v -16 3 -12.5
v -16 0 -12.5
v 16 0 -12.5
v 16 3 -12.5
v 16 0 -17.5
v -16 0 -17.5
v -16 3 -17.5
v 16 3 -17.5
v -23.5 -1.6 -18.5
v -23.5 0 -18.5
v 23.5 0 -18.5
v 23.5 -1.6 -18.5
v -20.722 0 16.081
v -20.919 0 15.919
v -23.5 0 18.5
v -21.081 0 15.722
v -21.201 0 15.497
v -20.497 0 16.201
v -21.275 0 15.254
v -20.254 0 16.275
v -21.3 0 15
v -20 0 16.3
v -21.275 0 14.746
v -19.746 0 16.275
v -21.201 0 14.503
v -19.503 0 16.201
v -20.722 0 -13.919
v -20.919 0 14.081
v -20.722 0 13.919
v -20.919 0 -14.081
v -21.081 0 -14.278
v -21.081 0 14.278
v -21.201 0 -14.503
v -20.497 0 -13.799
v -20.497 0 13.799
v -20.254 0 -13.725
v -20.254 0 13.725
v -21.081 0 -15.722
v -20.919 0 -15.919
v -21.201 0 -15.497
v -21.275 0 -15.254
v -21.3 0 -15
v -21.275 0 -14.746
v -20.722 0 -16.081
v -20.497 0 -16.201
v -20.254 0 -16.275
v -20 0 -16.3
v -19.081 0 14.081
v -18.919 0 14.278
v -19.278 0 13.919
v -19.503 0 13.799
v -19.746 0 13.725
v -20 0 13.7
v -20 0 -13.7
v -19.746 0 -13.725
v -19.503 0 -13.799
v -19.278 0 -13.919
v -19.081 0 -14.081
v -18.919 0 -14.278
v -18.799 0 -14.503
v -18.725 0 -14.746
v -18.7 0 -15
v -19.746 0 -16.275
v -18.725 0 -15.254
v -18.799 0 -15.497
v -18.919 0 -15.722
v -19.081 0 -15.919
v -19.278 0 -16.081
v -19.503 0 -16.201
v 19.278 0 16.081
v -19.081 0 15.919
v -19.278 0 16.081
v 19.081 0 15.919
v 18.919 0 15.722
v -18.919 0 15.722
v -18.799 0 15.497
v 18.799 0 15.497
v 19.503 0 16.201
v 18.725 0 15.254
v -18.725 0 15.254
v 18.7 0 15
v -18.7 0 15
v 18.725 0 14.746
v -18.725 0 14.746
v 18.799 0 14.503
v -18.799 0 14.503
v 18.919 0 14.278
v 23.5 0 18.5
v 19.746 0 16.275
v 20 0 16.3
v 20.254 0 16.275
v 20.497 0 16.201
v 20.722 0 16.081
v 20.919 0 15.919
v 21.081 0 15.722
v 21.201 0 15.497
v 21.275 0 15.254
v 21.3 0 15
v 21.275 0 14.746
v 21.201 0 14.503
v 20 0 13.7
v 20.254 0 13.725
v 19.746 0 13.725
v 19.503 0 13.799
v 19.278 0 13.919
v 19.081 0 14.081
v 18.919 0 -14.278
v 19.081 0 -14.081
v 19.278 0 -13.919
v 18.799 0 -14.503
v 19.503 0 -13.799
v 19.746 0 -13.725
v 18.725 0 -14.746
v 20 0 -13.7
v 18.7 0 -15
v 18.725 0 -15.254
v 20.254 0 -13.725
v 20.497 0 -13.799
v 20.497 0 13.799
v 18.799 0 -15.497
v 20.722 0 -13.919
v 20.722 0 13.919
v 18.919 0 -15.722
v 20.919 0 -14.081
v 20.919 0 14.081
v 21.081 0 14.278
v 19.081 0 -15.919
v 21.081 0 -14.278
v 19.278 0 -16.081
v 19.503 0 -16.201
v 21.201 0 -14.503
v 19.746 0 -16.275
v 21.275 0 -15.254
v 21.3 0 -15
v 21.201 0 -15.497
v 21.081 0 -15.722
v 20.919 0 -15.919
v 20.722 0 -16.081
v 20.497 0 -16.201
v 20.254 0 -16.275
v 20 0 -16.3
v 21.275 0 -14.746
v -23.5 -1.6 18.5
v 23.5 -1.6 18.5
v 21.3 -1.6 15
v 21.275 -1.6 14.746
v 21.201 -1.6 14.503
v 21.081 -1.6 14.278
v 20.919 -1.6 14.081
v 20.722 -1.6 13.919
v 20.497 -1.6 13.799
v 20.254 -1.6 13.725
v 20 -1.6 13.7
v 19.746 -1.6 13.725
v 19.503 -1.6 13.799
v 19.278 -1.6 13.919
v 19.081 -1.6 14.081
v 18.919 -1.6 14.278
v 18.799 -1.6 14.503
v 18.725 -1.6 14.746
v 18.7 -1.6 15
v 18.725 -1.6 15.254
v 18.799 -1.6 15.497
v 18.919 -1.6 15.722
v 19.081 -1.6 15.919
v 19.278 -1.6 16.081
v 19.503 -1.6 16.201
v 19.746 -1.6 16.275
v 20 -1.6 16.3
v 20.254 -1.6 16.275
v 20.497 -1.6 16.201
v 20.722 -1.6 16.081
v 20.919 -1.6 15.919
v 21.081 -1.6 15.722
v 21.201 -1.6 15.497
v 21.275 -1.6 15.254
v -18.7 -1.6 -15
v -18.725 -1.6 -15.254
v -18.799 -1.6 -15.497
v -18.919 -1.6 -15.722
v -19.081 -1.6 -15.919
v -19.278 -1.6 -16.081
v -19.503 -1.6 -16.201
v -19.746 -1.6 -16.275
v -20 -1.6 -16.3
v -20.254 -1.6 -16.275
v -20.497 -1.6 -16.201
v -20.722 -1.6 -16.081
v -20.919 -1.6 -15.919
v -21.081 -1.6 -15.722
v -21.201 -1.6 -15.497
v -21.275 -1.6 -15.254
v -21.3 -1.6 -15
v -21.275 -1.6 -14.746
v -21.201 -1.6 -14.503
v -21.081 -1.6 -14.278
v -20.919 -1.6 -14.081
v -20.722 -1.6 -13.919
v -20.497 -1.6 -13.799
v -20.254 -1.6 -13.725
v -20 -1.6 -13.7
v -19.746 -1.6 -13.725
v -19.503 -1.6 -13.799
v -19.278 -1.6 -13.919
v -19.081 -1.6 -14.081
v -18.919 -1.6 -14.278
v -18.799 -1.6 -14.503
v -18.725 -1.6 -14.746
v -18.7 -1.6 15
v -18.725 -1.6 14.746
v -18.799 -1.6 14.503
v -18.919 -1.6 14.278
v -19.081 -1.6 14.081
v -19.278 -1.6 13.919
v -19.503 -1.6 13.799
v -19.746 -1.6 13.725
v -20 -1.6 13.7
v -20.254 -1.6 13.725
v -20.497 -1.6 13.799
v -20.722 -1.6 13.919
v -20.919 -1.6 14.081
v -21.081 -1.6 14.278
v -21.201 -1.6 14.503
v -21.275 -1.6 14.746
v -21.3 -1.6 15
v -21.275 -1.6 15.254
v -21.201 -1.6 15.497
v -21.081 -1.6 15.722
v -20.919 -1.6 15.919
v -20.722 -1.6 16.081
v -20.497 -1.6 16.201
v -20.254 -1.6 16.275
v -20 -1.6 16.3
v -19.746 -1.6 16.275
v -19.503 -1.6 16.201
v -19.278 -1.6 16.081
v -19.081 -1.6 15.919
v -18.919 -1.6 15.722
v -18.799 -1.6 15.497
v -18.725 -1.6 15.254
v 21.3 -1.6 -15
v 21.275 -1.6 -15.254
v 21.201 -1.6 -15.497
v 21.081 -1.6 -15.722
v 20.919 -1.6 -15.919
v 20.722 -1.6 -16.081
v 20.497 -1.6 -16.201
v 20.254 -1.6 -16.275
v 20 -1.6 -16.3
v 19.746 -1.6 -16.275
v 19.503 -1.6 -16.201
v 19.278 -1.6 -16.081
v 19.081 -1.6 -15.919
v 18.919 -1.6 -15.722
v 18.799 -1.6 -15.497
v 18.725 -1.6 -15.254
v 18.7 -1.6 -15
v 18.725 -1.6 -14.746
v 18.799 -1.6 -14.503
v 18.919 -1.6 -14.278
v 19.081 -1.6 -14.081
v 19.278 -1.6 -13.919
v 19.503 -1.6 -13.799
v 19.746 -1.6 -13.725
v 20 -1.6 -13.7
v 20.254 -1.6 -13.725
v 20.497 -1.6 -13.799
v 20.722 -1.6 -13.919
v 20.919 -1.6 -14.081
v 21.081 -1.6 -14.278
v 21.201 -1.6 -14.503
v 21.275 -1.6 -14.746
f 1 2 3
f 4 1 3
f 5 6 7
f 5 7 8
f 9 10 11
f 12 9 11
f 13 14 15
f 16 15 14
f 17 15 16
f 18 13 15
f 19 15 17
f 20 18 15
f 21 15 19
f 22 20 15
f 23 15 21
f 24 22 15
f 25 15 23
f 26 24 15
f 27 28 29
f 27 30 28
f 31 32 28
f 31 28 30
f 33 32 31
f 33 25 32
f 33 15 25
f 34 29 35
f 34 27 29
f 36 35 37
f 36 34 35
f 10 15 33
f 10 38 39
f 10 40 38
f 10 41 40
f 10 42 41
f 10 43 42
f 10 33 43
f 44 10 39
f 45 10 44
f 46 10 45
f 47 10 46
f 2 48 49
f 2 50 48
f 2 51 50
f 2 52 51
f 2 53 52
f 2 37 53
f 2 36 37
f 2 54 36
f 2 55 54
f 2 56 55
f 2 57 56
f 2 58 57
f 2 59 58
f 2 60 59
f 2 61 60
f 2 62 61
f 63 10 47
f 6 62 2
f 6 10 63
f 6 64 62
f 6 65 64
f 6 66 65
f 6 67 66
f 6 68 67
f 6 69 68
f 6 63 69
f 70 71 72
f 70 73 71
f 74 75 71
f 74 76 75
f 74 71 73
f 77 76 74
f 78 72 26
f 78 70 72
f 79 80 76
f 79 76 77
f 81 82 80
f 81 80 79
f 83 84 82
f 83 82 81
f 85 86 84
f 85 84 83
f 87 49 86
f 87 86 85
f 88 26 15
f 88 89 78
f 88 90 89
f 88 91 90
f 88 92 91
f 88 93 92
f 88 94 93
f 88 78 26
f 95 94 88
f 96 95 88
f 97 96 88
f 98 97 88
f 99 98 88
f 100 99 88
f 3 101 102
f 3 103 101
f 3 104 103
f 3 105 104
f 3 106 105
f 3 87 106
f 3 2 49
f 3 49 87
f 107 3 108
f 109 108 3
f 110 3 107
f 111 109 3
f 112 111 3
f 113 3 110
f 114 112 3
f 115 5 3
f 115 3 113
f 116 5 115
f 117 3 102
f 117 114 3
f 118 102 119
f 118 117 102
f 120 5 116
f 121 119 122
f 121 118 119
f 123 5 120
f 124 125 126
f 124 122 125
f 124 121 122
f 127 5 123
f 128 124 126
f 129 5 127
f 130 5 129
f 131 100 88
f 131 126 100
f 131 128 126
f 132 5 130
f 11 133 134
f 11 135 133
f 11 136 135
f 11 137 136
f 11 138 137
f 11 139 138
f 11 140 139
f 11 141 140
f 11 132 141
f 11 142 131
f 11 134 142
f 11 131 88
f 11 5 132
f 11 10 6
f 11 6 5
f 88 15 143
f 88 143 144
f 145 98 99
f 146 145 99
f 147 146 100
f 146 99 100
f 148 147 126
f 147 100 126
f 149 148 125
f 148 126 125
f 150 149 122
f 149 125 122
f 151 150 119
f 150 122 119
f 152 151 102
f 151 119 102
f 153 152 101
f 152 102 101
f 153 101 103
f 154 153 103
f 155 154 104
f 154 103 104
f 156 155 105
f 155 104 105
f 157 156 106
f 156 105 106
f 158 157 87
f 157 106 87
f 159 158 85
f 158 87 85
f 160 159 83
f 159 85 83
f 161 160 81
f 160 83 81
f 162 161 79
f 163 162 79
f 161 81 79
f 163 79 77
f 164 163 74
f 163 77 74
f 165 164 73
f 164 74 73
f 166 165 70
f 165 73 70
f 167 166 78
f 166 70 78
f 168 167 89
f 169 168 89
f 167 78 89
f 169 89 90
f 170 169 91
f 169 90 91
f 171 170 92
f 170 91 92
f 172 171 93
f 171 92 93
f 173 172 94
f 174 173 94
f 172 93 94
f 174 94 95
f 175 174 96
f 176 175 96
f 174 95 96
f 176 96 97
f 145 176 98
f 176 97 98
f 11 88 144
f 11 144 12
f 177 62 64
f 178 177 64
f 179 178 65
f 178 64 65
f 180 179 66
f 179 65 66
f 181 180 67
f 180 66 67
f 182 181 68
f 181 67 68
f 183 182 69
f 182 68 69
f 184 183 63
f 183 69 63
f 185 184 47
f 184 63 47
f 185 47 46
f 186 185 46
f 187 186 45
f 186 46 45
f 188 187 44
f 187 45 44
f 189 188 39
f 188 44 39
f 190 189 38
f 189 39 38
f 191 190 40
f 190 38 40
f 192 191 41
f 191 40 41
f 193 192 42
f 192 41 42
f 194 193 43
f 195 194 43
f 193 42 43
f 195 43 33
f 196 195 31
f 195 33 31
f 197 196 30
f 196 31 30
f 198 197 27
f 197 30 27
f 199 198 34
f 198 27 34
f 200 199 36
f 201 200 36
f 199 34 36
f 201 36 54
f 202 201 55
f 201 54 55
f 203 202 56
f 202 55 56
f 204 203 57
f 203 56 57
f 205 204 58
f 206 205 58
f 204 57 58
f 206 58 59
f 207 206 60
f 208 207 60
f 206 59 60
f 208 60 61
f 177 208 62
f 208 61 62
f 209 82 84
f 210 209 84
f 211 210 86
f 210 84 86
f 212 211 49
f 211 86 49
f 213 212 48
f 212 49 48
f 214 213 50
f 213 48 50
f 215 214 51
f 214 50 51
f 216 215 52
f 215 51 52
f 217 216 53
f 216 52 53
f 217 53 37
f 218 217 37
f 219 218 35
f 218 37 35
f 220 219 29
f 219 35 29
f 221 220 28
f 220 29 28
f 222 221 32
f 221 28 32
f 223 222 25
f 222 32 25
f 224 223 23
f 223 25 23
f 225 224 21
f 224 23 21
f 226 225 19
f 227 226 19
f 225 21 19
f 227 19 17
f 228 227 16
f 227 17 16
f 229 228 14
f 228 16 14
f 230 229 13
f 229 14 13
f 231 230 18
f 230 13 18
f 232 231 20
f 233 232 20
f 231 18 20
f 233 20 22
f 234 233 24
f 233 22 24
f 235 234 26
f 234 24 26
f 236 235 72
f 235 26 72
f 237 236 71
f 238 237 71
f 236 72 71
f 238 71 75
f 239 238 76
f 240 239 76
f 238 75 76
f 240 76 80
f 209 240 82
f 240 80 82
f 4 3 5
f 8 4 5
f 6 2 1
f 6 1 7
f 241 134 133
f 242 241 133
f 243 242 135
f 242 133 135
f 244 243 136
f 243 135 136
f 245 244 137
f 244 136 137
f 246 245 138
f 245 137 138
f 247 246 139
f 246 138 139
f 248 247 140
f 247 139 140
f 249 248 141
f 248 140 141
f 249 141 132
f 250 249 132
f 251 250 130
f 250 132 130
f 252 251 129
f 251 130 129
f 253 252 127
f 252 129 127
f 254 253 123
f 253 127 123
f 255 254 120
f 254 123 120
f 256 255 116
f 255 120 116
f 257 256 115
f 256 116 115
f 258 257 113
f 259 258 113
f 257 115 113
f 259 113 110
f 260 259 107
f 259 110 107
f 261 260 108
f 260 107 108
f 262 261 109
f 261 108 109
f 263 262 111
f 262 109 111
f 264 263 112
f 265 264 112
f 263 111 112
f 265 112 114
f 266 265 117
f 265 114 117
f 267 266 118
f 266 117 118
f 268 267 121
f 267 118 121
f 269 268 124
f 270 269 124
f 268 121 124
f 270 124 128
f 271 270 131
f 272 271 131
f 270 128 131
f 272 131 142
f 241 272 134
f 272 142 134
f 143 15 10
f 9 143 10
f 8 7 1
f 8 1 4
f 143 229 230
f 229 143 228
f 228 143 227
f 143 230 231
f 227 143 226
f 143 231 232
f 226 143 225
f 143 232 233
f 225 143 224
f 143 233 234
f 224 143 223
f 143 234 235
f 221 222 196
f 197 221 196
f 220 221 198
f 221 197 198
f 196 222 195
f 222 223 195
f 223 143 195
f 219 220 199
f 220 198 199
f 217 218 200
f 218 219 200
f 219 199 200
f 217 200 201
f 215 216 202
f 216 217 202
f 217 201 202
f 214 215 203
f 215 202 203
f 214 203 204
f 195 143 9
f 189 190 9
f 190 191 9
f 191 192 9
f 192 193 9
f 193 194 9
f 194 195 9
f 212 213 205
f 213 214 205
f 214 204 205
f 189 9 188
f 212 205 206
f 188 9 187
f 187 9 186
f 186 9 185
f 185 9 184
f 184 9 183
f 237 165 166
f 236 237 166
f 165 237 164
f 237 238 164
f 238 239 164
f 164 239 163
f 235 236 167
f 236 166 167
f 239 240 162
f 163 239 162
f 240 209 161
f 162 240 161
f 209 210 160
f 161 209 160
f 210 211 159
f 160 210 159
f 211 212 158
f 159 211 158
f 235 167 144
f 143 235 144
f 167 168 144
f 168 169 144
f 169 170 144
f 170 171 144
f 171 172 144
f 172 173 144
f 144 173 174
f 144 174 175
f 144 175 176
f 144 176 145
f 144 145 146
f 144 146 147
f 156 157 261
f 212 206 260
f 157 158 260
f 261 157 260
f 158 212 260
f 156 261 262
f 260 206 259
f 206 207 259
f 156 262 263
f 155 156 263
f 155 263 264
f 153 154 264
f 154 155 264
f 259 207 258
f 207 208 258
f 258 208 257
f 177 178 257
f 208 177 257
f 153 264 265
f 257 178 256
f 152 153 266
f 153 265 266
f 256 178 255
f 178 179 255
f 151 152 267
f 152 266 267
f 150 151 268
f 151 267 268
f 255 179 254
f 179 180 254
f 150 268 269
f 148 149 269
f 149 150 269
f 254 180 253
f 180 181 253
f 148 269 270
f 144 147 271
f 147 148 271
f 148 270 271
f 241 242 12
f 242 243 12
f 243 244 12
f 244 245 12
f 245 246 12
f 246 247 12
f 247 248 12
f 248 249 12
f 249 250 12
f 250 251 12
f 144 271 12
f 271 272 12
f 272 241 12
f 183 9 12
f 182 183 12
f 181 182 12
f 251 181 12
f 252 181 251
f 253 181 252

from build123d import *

# Parameters (mm, degrees)
SKETCH_1_W          = 47
SKETCH_1_H          = 37
EXTRUDE_1_DEPTH     = 1.6
SKETCH_2_R          = 1.3
CUT_EXTRUDE_1_DEPTH = 1.6
SKETCH_3_W          = 32
SKETCH_3_H          = 5
EXTRUDE_2_DEPTH     = 3


with BuildPart() as part:
    # Эскиз1 → Бобышка-Вытянуть1 (new body)
    with BuildSketch(Plane(origin=(0, 0, 0), x_dir=(1, 0, 0), z_dir=(0, 1, 0))):
        Rectangle(SKETCH_1_W, SKETCH_1_H)
    extrude(amount=-EXTRUDE_1_DEPTH)

    # Эскиз2 → Вырез-Вытянуть1 (cut)
    with BuildSketch(Plane(origin=(0, 0, 0), x_dir=(1, 0, 0), z_dir=(0, 1, 0))):
        with Locations((-20, 15)):
            Circle(SKETCH_2_R)
        with Locations((-20, -15)):
            Circle(SKETCH_2_R)
        with Locations((20, -15)):
            Circle(SKETCH_2_R)
        with Locations((20, 15)):
            Circle(SKETCH_2_R)
    extrude(amount=-CUT_EXTRUDE_1_DEPTH, mode=Mode.SUBTRACT)

    # Эскиз3 → Бобышка-Вытянуть2 (add)
    with BuildSketch(Plane(origin=(0, 0, 0), x_dir=(1, 0, 0), z_dir=(0, 1, 0))):
        with Locations((0, 15)):
            Rectangle(SKETCH_3_W, SKETCH_3_H)
    extrude(amount=EXTRUDE_2_DEPTH)


solid = part.part
